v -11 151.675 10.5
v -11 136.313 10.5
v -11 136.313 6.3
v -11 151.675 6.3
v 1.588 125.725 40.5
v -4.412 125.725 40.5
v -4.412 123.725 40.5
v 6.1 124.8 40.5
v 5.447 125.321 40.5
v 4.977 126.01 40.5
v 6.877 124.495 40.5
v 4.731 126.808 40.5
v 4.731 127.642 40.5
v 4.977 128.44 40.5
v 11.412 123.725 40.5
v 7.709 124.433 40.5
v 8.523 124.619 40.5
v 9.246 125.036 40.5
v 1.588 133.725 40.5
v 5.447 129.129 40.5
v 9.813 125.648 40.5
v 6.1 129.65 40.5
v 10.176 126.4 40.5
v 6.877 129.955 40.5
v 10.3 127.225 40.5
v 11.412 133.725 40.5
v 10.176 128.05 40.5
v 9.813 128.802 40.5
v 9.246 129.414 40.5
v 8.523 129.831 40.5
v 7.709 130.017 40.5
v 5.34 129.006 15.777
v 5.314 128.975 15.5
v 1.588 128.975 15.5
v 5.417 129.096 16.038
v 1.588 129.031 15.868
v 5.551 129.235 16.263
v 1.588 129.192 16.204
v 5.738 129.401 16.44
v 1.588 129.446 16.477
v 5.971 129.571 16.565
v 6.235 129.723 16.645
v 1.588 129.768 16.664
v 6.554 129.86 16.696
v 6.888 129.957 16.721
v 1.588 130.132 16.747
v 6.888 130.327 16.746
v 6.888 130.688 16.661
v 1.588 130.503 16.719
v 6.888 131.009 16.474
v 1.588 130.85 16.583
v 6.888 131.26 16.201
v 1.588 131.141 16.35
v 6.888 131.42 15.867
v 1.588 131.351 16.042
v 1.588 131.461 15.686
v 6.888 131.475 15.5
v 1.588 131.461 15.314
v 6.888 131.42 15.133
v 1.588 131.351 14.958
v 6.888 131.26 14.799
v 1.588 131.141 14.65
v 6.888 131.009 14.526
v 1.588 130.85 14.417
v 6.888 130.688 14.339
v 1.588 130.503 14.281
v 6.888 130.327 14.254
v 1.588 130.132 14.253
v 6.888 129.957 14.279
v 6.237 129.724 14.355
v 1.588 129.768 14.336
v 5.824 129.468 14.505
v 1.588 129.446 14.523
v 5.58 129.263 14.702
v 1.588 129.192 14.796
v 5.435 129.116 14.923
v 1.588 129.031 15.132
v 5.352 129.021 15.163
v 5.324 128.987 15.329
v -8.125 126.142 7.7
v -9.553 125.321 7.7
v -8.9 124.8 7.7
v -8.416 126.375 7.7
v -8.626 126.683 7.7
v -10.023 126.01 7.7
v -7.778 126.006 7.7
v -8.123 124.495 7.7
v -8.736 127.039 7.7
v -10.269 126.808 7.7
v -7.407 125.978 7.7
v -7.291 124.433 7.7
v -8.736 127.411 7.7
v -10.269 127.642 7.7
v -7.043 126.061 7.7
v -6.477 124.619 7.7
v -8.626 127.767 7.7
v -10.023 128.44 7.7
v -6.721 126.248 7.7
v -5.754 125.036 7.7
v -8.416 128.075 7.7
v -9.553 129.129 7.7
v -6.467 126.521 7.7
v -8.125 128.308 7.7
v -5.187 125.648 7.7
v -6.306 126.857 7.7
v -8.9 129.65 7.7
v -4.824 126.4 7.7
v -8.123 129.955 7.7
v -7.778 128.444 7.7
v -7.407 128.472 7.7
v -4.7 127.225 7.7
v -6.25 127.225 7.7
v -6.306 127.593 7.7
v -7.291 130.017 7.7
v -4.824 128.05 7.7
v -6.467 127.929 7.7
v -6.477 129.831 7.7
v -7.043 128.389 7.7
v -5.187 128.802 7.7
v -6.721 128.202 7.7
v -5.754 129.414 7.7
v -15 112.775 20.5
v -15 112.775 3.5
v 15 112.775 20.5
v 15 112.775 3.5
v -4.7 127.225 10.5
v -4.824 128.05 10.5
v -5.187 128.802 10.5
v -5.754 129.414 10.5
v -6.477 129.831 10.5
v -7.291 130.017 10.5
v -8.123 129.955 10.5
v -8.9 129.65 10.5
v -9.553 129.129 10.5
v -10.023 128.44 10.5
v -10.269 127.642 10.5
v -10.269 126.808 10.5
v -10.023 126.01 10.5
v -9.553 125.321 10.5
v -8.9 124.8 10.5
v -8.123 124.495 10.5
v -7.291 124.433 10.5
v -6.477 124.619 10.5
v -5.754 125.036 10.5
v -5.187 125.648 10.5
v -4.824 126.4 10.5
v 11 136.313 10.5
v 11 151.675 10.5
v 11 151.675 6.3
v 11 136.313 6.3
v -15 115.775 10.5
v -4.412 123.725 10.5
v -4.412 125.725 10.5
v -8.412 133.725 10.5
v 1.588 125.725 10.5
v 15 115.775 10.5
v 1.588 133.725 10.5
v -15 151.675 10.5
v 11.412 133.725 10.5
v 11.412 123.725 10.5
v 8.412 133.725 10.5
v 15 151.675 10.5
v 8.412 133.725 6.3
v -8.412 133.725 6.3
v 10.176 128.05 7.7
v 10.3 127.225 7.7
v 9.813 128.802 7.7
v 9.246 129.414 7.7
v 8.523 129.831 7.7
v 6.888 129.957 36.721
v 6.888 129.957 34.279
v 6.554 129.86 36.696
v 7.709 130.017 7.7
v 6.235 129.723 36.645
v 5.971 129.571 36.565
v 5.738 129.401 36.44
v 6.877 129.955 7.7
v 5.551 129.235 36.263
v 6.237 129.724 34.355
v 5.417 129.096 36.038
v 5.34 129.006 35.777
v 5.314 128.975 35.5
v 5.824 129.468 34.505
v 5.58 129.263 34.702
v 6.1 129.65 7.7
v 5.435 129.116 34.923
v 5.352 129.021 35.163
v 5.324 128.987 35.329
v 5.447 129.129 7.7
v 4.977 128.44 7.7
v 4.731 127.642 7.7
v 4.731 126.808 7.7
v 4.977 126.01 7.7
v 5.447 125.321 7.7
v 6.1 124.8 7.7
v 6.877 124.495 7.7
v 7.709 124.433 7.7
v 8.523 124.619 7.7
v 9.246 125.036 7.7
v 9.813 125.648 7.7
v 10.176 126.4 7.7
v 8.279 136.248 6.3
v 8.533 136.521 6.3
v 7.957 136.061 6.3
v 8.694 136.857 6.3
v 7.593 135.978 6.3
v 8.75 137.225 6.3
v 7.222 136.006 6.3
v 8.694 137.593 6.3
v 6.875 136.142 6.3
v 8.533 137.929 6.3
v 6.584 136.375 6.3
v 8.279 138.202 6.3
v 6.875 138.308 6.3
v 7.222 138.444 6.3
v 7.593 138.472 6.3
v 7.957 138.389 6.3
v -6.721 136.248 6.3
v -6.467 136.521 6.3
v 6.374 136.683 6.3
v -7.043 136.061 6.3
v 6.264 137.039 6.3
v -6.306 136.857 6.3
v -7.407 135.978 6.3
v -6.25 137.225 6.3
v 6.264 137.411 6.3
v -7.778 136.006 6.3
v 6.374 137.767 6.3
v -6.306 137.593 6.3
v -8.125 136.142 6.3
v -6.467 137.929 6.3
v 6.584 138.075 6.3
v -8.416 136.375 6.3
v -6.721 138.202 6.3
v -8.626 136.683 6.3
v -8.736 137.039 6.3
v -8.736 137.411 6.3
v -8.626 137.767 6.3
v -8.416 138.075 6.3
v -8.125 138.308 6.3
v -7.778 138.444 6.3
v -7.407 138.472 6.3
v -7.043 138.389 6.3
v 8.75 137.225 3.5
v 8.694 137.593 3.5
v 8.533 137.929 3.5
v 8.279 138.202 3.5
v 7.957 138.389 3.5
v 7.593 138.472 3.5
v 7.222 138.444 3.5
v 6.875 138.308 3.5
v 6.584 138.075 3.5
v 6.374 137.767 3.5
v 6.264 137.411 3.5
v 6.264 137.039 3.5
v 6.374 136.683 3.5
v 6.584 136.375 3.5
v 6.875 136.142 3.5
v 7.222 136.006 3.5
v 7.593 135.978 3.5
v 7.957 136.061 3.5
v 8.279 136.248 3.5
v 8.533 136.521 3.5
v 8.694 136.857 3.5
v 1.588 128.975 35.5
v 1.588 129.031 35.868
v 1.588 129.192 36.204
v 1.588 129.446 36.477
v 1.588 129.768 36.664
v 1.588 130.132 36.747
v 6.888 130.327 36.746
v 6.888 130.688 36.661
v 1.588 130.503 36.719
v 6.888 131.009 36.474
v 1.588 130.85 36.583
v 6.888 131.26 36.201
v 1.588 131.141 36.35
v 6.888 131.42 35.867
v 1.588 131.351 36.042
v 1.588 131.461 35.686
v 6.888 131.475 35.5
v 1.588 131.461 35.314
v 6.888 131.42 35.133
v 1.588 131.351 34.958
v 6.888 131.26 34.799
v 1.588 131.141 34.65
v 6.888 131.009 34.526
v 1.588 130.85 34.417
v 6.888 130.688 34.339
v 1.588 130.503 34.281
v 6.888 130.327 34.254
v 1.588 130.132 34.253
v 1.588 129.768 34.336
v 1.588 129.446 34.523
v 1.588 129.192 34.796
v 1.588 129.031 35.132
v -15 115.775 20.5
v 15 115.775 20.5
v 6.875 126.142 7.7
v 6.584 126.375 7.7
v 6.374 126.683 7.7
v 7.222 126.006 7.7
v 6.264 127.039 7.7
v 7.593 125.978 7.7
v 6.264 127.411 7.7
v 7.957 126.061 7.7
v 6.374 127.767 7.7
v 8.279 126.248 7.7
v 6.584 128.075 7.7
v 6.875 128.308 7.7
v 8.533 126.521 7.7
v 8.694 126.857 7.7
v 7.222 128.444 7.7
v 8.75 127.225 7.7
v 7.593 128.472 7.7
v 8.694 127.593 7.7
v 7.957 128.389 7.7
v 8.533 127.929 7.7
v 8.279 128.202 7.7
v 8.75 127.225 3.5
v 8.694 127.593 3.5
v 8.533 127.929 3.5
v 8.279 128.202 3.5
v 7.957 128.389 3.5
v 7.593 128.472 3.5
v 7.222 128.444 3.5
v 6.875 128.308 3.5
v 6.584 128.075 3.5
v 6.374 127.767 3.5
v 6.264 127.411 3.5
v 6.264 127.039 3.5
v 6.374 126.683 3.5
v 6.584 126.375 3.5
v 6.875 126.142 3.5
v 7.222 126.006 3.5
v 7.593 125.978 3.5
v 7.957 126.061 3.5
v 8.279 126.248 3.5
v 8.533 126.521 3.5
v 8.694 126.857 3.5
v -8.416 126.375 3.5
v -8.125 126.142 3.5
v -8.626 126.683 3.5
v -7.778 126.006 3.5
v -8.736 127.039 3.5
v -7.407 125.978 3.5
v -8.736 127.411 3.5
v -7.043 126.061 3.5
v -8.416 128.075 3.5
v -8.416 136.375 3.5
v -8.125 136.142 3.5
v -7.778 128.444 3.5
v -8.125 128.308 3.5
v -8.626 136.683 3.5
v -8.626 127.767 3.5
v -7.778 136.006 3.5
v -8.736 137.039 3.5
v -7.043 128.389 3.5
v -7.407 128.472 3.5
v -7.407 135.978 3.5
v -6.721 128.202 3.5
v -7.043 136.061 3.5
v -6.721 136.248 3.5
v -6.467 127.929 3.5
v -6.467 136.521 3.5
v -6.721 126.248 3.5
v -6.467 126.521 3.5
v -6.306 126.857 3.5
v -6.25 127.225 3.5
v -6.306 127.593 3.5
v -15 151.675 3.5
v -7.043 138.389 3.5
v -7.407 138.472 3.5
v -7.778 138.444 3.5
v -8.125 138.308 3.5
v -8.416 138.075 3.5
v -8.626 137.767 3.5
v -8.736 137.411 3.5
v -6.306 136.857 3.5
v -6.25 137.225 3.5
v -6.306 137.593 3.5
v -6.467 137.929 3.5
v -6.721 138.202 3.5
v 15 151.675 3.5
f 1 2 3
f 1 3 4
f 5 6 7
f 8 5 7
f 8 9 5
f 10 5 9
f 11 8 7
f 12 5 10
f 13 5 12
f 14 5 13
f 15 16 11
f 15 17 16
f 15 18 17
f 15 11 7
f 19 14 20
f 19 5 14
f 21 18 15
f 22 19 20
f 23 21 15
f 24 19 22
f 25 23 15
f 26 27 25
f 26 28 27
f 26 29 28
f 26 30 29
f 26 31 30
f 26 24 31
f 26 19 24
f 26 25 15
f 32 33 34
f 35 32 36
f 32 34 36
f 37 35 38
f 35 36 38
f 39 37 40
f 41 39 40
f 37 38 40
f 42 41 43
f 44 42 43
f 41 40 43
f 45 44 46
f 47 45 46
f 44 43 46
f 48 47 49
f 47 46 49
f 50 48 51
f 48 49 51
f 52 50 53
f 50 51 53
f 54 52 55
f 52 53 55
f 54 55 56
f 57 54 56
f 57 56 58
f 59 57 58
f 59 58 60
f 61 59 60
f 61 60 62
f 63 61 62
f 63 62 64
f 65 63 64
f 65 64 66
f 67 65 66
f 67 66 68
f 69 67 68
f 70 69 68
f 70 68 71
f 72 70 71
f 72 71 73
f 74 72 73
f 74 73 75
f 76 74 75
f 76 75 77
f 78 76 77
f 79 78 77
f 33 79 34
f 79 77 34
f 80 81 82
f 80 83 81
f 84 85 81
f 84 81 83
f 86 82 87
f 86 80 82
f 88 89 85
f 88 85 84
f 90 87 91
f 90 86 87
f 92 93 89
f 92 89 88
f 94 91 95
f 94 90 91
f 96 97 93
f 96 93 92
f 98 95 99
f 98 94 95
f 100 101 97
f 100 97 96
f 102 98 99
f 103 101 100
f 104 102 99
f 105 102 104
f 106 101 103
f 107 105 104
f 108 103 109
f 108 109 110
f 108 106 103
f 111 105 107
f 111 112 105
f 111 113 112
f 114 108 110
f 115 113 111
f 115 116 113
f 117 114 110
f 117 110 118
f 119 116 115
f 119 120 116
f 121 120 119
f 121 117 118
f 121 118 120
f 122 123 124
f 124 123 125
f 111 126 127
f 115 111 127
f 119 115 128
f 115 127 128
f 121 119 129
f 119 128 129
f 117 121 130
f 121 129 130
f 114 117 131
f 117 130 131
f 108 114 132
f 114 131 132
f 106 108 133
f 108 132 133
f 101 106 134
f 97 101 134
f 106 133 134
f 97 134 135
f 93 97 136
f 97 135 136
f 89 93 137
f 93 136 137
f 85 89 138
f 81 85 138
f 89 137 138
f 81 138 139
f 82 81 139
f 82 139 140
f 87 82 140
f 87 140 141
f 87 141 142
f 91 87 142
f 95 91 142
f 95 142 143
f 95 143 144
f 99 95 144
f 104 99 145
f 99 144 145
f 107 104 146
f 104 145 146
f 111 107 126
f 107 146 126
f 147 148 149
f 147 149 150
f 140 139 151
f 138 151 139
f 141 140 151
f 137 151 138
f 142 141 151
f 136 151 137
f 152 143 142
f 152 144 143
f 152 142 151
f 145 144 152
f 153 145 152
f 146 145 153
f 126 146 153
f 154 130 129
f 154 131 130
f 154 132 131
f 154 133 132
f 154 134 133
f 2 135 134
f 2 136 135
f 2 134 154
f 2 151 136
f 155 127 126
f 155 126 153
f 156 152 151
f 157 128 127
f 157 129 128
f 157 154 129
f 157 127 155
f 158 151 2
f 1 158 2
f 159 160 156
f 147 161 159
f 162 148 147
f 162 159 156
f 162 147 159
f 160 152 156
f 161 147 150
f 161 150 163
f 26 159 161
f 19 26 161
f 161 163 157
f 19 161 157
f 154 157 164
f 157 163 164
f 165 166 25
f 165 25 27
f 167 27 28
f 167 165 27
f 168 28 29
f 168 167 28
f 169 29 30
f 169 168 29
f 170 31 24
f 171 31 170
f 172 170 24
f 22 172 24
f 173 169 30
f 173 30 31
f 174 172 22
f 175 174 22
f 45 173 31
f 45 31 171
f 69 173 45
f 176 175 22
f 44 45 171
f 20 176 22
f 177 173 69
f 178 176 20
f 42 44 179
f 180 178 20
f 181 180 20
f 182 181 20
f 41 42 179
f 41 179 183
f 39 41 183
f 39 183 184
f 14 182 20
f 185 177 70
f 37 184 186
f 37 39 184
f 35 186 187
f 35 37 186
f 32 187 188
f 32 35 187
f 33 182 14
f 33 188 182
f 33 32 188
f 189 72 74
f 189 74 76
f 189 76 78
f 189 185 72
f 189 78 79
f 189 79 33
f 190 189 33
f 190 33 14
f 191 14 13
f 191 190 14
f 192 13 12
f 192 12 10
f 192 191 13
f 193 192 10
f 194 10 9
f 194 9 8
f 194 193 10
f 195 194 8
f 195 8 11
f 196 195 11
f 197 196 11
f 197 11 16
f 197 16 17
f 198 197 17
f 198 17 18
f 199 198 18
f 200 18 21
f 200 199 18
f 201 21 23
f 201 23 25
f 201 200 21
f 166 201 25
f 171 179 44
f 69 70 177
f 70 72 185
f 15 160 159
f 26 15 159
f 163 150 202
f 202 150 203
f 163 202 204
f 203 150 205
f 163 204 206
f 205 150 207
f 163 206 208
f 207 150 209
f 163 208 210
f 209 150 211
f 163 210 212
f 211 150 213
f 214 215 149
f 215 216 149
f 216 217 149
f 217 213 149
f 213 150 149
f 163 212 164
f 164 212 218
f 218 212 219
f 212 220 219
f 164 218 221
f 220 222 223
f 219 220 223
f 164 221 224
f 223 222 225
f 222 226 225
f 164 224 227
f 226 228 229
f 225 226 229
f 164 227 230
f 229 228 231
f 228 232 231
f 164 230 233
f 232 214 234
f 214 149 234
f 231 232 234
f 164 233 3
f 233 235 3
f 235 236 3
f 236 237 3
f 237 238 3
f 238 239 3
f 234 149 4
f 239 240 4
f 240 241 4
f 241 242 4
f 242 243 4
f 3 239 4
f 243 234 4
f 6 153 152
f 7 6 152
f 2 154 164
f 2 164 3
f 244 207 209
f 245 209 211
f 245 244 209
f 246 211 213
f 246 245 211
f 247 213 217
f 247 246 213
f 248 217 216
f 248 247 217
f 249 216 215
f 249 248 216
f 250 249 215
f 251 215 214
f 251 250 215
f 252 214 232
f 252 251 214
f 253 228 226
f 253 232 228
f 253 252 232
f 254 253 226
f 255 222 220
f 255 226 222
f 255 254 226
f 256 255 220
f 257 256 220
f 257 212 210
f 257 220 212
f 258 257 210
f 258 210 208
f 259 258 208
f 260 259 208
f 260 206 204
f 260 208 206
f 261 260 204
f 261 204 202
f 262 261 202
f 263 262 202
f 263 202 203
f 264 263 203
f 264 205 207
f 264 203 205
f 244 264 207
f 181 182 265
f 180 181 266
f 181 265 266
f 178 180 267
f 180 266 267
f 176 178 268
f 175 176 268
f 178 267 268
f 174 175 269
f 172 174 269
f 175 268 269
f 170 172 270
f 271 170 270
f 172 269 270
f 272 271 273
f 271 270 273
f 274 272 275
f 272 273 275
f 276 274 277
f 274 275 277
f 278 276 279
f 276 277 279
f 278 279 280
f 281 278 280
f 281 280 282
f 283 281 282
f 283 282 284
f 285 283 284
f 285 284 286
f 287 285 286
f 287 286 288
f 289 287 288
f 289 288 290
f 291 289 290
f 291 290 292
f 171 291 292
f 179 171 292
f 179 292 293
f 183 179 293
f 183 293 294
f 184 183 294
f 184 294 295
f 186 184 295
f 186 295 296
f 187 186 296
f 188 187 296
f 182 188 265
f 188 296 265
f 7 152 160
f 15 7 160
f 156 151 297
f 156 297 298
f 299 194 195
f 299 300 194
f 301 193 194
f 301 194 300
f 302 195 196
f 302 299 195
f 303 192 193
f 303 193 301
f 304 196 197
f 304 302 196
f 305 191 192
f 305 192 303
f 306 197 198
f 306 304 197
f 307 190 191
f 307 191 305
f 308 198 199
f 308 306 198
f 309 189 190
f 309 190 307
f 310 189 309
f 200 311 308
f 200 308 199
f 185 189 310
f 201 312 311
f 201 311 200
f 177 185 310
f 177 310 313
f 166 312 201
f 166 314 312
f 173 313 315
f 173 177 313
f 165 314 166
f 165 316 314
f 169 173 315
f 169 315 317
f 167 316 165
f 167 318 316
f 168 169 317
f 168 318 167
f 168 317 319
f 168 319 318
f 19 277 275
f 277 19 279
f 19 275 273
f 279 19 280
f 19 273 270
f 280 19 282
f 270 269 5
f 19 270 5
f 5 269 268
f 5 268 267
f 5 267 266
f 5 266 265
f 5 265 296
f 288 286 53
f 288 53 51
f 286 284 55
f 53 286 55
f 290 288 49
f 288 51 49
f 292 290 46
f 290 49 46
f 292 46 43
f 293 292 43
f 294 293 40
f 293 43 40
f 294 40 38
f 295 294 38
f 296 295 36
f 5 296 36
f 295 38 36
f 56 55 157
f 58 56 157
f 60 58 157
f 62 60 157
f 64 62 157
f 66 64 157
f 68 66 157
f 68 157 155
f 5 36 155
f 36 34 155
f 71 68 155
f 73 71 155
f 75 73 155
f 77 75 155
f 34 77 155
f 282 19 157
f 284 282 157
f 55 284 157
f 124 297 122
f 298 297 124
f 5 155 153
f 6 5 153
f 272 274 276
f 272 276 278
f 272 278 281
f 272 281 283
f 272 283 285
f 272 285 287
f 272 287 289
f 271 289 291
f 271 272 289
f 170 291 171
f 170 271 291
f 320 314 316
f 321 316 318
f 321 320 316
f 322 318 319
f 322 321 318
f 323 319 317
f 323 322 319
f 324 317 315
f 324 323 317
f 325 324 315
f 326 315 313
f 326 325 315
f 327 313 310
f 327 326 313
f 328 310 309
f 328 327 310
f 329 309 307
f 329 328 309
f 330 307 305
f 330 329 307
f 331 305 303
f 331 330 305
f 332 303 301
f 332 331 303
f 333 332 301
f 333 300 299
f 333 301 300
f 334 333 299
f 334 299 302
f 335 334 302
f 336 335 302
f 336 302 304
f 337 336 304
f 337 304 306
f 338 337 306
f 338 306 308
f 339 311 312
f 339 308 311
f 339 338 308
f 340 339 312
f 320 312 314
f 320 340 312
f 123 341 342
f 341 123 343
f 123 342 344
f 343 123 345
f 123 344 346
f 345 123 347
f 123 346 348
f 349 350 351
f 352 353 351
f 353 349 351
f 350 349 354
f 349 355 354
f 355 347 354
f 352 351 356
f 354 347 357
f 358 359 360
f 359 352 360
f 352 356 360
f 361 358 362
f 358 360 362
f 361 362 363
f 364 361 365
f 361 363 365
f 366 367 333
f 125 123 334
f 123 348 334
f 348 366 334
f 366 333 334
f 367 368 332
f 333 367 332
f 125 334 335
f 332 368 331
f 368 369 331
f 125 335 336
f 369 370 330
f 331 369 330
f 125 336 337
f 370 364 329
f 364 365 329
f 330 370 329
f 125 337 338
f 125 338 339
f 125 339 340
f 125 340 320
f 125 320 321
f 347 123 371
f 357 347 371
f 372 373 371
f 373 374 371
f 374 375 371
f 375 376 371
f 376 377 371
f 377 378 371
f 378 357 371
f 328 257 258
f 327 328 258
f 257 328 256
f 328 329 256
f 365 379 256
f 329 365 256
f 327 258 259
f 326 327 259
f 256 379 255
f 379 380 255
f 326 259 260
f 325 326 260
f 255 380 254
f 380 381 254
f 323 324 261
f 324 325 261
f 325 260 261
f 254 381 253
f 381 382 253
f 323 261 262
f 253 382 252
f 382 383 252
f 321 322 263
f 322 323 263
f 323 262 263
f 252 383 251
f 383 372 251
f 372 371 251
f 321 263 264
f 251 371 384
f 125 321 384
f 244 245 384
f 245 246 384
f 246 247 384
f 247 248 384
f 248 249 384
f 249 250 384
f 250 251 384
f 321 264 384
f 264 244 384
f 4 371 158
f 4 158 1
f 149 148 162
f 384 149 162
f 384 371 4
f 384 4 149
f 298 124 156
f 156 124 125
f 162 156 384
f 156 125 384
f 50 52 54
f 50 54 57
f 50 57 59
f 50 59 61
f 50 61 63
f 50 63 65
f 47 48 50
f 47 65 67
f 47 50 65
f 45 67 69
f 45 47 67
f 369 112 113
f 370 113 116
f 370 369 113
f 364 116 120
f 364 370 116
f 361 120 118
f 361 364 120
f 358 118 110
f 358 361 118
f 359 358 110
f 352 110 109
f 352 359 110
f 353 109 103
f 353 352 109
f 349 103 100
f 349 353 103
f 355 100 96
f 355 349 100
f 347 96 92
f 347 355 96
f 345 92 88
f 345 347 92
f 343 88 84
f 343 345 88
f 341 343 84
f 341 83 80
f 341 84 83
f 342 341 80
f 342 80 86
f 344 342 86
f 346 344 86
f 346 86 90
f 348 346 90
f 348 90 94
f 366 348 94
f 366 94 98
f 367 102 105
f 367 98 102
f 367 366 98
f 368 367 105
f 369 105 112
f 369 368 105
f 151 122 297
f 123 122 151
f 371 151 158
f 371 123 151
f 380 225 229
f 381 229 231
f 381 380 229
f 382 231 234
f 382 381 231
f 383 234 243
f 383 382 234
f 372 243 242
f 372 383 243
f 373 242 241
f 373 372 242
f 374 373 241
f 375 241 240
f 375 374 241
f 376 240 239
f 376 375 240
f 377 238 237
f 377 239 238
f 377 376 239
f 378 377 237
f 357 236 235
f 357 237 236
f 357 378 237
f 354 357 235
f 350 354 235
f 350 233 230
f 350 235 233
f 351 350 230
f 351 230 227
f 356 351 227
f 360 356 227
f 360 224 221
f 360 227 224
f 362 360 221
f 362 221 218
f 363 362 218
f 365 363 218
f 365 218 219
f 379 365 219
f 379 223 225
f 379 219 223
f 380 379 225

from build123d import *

# Parameters (mm, degrees)
SKETCH016_W     = 30
SKETCH016_H     = 38.9
SKETCH016_R     = 1.25
PAD010_DEPTH    = 7
POCKET005_DEPTH = 4.2
SKETCH020_R     = 2.8
POCKET006_DEPTH = 2.8
SKETCH021_R     = 2.8
PAD011_DEPTH    = 30
SKETCH022_R     = 1.25
POCKET007_DEPTH = 5.3
SKETCH026_W     = 30
SKETCH026_H     = 3
PAD015_DEPTH    = 10


with BuildPart() as part:
    # Sketch016 (on Face1 of ReferencePad007) → Pad010 (new body)
    with BuildSketch(Plane.XY.offset(3.5)):
        with Locations((0, 132.225)):
            Rectangle(SKETCH016_W, SKETCH016_H)
        with Locations((-7.5, 137.225)):
            Circle(SKETCH016_R, mode=Mode.SUBTRACT)
        with Locations((-7.5, 127.225)):
            Circle(SKETCH016_R, mode=Mode.SUBTRACT)
        with Locations((7.5, 137.225)):
            Circle(SKETCH016_R, mode=Mode.SUBTRACT)
        with Locations((7.5, 127.225)):
            Circle(SKETCH016_R, mode=Mode.SUBTRACT)
    extrude(amount=PAD010_DEPTH)

    # Sketch019 (on Face10 of Pad010) → Pocket005 (cut)
    with BuildSketch(Plane.XY.offset(10.5)):
        Polygon((-8.411624, 133.725), (-11, 136.313376), (-11, 151.675), (11, 151.675), (11, 136.313376), (8.411624, 133.725), align=None)
    extrude(amount=-POCKET005_DEPTH, mode=Mode.SUBTRACT)

    # Sketch020 (on Face5 of Pocket005) → Pocket006 (cut)
    with BuildSketch(Plane.XY.offset(10.5)):
        with Locations((-7.5, 127.225)):
            Circle(SKETCH020_R)
        with Locations((7.5, 127.225)):
            Circle(SKETCH020_R)
    extrude(amount=-POCKET006_DEPTH, mode=Mode.SUBTRACT)

    # Sketch021 (on Face5 of Pocket006) → Pad011 (join)
    with BuildSketch(Plane.XY.offset(10.5)):
        Polygon((-4.411624, 123.725), (11.411624, 123.725), (11.411624, 133.725), (1.588376, 133.725), (1.588376, 125.725), (-4.411624, 125.725), align=None)
        with Locations((7.5, 127.225)):
            Circle(SKETCH021_R, mode=Mode.SUBTRACT)
    extrude(amount=PAD011_DEPTH)

    # Sketch022 (on Face14 of Pad011) → Pocket007 (cut)
    with BuildSketch(Plane(origin=(1.588376, 0, 8), x_dir=(0, -1, 0), z_dir=(-1, 0, 0))):
        with Locations((-130.225, 27.5)):
            Circle(SKETCH022_R)
        with Locations((-130.225, 7.5)):
            Circle(SKETCH022_R)
    extrude(amount=-POCKET007_DEPTH, mode=Mode.SUBTRACT)

    # Sketch026 (on Face5 of Pocket007) → Pad015 (join)
    with BuildSketch(Plane.XY.offset(10.5)):
        with Locations((0, 114.275)):
            Rectangle(SKETCH026_W, SKETCH026_H)
    extrude(amount=PAD015_DEPTH)


solid = part.part
